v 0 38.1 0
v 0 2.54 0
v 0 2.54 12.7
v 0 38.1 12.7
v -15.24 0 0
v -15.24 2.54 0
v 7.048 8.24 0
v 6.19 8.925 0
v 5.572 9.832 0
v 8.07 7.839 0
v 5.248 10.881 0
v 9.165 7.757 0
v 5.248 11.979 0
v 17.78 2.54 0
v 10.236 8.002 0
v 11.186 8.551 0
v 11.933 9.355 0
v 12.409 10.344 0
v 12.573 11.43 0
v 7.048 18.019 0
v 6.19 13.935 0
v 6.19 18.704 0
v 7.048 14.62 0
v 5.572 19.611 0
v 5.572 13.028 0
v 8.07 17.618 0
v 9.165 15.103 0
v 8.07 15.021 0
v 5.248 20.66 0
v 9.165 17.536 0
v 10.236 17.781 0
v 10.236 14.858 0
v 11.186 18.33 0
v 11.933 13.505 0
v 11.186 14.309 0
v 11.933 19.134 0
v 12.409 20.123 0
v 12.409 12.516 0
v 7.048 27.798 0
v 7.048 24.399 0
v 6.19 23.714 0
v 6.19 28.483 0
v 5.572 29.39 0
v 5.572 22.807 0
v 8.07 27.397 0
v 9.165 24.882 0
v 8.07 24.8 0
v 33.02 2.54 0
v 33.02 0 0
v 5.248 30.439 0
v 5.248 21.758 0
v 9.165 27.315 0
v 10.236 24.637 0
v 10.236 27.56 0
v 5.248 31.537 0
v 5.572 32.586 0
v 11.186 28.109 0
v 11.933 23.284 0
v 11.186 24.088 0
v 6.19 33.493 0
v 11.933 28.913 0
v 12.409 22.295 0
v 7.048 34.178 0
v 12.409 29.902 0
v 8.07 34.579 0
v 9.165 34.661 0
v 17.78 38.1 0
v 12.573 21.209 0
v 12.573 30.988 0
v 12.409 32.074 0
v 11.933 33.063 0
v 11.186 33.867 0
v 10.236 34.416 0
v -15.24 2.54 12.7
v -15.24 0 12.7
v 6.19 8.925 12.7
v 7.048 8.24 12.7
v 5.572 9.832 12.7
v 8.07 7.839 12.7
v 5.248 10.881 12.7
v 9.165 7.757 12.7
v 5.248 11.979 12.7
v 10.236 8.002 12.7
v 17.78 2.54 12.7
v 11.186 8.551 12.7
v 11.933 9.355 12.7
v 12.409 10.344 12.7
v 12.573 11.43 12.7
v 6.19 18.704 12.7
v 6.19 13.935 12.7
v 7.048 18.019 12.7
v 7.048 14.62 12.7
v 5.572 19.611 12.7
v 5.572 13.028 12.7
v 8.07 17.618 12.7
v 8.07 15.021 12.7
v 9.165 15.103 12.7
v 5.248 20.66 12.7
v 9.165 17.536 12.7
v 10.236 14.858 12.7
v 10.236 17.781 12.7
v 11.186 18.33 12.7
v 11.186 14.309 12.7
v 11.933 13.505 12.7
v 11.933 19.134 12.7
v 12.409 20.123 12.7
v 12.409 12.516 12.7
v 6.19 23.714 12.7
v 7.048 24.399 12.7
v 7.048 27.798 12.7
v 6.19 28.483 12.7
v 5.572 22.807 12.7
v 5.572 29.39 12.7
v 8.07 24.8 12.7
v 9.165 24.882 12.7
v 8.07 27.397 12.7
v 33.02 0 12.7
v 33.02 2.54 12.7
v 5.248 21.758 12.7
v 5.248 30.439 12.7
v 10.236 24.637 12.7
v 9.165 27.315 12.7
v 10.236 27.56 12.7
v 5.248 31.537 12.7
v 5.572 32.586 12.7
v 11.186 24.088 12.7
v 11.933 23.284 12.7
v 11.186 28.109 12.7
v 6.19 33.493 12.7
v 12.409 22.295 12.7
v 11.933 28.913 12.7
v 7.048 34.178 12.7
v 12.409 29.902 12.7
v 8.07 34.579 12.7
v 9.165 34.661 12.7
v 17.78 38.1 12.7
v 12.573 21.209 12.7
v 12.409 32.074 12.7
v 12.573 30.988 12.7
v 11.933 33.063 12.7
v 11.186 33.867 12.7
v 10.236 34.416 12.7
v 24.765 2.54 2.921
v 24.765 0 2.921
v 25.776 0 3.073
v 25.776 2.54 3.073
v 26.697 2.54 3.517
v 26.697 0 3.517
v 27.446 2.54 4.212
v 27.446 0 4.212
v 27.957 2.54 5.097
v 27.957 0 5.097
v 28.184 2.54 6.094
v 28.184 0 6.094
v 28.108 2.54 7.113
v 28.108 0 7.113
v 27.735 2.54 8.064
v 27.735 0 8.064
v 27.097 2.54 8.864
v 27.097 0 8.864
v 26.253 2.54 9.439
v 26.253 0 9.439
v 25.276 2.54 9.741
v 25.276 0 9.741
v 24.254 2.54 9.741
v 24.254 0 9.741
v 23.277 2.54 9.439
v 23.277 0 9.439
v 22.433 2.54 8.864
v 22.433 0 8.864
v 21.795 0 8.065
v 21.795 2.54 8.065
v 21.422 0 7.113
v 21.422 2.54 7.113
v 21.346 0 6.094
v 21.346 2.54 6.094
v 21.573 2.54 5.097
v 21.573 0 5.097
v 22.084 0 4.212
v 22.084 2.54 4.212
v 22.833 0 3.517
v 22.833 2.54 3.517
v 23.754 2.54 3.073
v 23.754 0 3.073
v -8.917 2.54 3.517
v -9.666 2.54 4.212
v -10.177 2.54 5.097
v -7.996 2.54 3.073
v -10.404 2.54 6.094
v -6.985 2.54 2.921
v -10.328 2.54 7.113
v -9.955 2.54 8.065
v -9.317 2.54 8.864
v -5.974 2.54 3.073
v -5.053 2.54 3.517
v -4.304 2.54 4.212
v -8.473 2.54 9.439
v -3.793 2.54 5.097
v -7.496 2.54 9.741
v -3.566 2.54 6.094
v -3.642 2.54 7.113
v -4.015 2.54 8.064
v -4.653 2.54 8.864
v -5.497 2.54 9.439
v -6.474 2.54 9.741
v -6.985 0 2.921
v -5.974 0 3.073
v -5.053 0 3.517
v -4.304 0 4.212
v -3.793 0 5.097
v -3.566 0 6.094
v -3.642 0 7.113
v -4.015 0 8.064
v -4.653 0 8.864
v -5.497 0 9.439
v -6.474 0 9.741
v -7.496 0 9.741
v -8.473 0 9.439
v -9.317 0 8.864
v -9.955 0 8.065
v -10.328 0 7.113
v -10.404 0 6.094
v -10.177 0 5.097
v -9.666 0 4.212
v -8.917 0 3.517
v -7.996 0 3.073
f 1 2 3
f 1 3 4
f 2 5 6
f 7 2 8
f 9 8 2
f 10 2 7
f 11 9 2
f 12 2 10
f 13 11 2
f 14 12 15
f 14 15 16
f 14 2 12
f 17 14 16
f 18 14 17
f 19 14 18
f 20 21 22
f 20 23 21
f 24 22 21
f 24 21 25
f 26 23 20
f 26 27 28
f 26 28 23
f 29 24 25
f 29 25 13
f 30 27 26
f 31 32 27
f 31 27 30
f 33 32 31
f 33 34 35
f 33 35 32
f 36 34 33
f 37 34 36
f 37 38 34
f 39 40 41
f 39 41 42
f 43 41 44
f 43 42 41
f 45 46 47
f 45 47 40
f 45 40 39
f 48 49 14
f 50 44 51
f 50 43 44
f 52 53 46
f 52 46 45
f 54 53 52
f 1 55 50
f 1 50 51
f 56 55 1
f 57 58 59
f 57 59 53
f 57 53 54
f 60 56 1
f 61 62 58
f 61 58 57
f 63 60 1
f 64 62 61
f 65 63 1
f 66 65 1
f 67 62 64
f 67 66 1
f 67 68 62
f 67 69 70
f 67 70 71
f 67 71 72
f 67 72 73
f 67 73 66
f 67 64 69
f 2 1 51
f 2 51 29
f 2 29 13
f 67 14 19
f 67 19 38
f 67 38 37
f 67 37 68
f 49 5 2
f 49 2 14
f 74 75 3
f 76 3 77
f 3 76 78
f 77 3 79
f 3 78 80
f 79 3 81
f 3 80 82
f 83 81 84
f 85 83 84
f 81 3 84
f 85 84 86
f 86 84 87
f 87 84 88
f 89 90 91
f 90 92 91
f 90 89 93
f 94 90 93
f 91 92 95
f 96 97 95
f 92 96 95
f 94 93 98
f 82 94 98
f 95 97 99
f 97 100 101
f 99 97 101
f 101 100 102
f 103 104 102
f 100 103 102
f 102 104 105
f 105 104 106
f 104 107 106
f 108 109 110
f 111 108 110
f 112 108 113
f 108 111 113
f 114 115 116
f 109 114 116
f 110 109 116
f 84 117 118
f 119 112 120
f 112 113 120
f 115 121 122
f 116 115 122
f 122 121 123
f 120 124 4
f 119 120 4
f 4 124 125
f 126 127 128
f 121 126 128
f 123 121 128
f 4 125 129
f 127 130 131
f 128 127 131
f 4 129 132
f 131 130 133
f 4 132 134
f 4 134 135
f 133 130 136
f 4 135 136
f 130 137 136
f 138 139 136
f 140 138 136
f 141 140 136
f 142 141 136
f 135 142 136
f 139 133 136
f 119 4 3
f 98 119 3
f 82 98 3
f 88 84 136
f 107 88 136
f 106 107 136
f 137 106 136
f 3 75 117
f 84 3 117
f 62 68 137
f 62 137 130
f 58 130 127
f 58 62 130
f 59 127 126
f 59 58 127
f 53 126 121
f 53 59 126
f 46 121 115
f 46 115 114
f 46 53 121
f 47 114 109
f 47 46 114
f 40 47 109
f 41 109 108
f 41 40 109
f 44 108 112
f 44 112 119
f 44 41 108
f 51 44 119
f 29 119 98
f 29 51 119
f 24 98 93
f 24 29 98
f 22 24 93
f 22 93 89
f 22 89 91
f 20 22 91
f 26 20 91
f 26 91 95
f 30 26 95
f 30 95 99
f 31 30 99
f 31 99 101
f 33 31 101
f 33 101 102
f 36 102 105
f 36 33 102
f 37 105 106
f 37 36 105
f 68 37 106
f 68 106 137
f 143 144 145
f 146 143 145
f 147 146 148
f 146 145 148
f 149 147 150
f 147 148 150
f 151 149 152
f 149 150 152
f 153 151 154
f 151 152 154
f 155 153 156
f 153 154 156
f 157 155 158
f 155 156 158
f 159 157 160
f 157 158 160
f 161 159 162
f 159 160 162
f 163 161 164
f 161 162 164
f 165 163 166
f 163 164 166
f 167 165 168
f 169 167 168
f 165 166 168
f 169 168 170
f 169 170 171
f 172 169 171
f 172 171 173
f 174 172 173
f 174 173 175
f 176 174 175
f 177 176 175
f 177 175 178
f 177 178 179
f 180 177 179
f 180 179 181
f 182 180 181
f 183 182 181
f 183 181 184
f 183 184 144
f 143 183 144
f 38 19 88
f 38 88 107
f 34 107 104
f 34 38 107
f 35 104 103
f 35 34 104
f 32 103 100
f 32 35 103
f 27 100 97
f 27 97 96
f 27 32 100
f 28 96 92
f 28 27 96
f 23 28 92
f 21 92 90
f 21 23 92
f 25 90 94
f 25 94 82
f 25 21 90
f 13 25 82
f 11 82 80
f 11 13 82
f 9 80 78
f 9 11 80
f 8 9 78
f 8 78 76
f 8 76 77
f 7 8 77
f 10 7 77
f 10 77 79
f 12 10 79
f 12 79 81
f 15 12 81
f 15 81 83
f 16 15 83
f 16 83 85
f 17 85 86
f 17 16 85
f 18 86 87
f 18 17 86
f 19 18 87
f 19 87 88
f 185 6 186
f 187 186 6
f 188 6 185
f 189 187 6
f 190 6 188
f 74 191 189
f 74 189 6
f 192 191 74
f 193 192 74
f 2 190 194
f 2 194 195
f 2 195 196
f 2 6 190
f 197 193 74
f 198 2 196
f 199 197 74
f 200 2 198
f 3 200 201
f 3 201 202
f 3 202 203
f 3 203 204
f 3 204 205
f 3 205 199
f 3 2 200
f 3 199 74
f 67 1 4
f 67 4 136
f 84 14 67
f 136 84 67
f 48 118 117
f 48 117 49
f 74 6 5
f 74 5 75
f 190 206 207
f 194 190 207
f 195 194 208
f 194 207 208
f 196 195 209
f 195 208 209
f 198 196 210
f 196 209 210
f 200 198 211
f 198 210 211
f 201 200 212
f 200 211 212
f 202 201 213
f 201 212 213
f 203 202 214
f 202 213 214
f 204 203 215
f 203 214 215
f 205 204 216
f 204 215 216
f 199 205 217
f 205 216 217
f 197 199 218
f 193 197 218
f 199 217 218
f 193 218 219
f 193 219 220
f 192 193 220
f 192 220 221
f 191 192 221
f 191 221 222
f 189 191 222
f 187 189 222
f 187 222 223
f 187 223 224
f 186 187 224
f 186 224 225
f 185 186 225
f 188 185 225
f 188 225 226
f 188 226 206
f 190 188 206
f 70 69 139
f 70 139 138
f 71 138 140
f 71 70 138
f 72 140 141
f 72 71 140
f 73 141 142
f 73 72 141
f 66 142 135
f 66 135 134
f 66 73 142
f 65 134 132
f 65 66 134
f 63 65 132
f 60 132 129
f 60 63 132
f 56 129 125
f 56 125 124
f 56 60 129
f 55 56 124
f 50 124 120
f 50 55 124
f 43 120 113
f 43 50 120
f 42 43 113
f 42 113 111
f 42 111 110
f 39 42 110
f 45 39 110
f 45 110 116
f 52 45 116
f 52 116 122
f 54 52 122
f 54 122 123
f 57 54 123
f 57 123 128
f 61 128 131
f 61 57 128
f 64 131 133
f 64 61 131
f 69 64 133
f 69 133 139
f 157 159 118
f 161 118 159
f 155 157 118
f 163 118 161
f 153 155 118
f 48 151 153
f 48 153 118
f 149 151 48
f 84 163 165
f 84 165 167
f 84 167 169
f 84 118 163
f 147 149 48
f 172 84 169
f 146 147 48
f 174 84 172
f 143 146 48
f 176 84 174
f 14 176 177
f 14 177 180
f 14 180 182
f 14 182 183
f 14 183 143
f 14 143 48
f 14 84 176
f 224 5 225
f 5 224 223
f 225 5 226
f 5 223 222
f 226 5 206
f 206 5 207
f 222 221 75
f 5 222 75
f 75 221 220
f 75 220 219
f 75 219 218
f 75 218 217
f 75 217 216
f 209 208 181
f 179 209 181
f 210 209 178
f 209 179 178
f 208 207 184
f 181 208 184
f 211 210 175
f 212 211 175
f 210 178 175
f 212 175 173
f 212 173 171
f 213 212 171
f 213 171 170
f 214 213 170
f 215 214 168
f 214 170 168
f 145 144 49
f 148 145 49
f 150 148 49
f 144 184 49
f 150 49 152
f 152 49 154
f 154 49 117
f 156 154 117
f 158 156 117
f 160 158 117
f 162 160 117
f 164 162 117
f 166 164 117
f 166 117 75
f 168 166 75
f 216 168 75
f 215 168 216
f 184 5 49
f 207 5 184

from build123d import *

# Parameters (mm, degrees)
SKETCH1_W           = 17.78
SKETCH1_H           = 38.1
SKETCH1_R           = 3.683
BOSS_EXTRUDE1_DEPTH = 12.7
SKETCH2_W           = 12.7
SKETCH2_H           = 2.54
BOSS_EXTRUDE2_DEPTH = 15.24
SKETCH3_W           = 12.7
SKETCH3_H           = 2.54
BOSS_EXTRUDE3_DEPTH = 15.24
SKETCH4_R           = 3.429
CUT_EXTRUDE1_DEPTH  = 52.992503306


with BuildPart() as part:
    # Sketch1 → Boss-Extrude1 (new body)
    with BuildSketch(Plane.XY):
        with Locations((8.89, 19.05)):
            Rectangle(SKETCH1_W, SKETCH1_H)
        with Locations((8.89, 30.988)):
            Circle(SKETCH1_R, mode=Mode.SUBTRACT)
        with Locations((8.89, 21.209)):
            Circle(SKETCH1_R, mode=Mode.SUBTRACT)
        with Locations((8.89, 11.43)):
            Circle(SKETCH1_R, mode=Mode.SUBTRACT)
    extrude(amount=BOSS_EXTRUDE1_DEPTH)

    # Sketch2 → Boss-Extrude2 (add)
    with BuildSketch(Plane(origin=(17.78, 0, 0), x_dir=(0, 0, -1), z_dir=(1, 0, 0))):
        with Locations((-6.35, 1.27)):
            Rectangle(SKETCH2_W, SKETCH2_H)
    extrude(amount=BOSS_EXTRUDE2_DEPTH)

    # Sketch3 → Boss-Extrude3 (add)
    with BuildSketch(Plane.ZY):
        with Locations((6.35, 1.27)):
            Rectangle(SKETCH3_W, SKETCH3_H)
    extrude(amount=BOSS_EXTRUDE3_DEPTH)

    # Sketch4 → Cut-Extrude1 (cut, through all)
    with BuildSketch(Plane.XZ):
        with Locations(Location((-6.985, 6.35, 0), (0, 0, 270))):
            Circle(SKETCH4_R)
        with Locations(Location((24.765, 6.35, 0), (0, 0, 270))):
            Circle(SKETCH4_R)
    extrude(amount=-CUT_EXTRUDE1_DEPTH, mode=Mode.SUBTRACT)


solid = part.part
